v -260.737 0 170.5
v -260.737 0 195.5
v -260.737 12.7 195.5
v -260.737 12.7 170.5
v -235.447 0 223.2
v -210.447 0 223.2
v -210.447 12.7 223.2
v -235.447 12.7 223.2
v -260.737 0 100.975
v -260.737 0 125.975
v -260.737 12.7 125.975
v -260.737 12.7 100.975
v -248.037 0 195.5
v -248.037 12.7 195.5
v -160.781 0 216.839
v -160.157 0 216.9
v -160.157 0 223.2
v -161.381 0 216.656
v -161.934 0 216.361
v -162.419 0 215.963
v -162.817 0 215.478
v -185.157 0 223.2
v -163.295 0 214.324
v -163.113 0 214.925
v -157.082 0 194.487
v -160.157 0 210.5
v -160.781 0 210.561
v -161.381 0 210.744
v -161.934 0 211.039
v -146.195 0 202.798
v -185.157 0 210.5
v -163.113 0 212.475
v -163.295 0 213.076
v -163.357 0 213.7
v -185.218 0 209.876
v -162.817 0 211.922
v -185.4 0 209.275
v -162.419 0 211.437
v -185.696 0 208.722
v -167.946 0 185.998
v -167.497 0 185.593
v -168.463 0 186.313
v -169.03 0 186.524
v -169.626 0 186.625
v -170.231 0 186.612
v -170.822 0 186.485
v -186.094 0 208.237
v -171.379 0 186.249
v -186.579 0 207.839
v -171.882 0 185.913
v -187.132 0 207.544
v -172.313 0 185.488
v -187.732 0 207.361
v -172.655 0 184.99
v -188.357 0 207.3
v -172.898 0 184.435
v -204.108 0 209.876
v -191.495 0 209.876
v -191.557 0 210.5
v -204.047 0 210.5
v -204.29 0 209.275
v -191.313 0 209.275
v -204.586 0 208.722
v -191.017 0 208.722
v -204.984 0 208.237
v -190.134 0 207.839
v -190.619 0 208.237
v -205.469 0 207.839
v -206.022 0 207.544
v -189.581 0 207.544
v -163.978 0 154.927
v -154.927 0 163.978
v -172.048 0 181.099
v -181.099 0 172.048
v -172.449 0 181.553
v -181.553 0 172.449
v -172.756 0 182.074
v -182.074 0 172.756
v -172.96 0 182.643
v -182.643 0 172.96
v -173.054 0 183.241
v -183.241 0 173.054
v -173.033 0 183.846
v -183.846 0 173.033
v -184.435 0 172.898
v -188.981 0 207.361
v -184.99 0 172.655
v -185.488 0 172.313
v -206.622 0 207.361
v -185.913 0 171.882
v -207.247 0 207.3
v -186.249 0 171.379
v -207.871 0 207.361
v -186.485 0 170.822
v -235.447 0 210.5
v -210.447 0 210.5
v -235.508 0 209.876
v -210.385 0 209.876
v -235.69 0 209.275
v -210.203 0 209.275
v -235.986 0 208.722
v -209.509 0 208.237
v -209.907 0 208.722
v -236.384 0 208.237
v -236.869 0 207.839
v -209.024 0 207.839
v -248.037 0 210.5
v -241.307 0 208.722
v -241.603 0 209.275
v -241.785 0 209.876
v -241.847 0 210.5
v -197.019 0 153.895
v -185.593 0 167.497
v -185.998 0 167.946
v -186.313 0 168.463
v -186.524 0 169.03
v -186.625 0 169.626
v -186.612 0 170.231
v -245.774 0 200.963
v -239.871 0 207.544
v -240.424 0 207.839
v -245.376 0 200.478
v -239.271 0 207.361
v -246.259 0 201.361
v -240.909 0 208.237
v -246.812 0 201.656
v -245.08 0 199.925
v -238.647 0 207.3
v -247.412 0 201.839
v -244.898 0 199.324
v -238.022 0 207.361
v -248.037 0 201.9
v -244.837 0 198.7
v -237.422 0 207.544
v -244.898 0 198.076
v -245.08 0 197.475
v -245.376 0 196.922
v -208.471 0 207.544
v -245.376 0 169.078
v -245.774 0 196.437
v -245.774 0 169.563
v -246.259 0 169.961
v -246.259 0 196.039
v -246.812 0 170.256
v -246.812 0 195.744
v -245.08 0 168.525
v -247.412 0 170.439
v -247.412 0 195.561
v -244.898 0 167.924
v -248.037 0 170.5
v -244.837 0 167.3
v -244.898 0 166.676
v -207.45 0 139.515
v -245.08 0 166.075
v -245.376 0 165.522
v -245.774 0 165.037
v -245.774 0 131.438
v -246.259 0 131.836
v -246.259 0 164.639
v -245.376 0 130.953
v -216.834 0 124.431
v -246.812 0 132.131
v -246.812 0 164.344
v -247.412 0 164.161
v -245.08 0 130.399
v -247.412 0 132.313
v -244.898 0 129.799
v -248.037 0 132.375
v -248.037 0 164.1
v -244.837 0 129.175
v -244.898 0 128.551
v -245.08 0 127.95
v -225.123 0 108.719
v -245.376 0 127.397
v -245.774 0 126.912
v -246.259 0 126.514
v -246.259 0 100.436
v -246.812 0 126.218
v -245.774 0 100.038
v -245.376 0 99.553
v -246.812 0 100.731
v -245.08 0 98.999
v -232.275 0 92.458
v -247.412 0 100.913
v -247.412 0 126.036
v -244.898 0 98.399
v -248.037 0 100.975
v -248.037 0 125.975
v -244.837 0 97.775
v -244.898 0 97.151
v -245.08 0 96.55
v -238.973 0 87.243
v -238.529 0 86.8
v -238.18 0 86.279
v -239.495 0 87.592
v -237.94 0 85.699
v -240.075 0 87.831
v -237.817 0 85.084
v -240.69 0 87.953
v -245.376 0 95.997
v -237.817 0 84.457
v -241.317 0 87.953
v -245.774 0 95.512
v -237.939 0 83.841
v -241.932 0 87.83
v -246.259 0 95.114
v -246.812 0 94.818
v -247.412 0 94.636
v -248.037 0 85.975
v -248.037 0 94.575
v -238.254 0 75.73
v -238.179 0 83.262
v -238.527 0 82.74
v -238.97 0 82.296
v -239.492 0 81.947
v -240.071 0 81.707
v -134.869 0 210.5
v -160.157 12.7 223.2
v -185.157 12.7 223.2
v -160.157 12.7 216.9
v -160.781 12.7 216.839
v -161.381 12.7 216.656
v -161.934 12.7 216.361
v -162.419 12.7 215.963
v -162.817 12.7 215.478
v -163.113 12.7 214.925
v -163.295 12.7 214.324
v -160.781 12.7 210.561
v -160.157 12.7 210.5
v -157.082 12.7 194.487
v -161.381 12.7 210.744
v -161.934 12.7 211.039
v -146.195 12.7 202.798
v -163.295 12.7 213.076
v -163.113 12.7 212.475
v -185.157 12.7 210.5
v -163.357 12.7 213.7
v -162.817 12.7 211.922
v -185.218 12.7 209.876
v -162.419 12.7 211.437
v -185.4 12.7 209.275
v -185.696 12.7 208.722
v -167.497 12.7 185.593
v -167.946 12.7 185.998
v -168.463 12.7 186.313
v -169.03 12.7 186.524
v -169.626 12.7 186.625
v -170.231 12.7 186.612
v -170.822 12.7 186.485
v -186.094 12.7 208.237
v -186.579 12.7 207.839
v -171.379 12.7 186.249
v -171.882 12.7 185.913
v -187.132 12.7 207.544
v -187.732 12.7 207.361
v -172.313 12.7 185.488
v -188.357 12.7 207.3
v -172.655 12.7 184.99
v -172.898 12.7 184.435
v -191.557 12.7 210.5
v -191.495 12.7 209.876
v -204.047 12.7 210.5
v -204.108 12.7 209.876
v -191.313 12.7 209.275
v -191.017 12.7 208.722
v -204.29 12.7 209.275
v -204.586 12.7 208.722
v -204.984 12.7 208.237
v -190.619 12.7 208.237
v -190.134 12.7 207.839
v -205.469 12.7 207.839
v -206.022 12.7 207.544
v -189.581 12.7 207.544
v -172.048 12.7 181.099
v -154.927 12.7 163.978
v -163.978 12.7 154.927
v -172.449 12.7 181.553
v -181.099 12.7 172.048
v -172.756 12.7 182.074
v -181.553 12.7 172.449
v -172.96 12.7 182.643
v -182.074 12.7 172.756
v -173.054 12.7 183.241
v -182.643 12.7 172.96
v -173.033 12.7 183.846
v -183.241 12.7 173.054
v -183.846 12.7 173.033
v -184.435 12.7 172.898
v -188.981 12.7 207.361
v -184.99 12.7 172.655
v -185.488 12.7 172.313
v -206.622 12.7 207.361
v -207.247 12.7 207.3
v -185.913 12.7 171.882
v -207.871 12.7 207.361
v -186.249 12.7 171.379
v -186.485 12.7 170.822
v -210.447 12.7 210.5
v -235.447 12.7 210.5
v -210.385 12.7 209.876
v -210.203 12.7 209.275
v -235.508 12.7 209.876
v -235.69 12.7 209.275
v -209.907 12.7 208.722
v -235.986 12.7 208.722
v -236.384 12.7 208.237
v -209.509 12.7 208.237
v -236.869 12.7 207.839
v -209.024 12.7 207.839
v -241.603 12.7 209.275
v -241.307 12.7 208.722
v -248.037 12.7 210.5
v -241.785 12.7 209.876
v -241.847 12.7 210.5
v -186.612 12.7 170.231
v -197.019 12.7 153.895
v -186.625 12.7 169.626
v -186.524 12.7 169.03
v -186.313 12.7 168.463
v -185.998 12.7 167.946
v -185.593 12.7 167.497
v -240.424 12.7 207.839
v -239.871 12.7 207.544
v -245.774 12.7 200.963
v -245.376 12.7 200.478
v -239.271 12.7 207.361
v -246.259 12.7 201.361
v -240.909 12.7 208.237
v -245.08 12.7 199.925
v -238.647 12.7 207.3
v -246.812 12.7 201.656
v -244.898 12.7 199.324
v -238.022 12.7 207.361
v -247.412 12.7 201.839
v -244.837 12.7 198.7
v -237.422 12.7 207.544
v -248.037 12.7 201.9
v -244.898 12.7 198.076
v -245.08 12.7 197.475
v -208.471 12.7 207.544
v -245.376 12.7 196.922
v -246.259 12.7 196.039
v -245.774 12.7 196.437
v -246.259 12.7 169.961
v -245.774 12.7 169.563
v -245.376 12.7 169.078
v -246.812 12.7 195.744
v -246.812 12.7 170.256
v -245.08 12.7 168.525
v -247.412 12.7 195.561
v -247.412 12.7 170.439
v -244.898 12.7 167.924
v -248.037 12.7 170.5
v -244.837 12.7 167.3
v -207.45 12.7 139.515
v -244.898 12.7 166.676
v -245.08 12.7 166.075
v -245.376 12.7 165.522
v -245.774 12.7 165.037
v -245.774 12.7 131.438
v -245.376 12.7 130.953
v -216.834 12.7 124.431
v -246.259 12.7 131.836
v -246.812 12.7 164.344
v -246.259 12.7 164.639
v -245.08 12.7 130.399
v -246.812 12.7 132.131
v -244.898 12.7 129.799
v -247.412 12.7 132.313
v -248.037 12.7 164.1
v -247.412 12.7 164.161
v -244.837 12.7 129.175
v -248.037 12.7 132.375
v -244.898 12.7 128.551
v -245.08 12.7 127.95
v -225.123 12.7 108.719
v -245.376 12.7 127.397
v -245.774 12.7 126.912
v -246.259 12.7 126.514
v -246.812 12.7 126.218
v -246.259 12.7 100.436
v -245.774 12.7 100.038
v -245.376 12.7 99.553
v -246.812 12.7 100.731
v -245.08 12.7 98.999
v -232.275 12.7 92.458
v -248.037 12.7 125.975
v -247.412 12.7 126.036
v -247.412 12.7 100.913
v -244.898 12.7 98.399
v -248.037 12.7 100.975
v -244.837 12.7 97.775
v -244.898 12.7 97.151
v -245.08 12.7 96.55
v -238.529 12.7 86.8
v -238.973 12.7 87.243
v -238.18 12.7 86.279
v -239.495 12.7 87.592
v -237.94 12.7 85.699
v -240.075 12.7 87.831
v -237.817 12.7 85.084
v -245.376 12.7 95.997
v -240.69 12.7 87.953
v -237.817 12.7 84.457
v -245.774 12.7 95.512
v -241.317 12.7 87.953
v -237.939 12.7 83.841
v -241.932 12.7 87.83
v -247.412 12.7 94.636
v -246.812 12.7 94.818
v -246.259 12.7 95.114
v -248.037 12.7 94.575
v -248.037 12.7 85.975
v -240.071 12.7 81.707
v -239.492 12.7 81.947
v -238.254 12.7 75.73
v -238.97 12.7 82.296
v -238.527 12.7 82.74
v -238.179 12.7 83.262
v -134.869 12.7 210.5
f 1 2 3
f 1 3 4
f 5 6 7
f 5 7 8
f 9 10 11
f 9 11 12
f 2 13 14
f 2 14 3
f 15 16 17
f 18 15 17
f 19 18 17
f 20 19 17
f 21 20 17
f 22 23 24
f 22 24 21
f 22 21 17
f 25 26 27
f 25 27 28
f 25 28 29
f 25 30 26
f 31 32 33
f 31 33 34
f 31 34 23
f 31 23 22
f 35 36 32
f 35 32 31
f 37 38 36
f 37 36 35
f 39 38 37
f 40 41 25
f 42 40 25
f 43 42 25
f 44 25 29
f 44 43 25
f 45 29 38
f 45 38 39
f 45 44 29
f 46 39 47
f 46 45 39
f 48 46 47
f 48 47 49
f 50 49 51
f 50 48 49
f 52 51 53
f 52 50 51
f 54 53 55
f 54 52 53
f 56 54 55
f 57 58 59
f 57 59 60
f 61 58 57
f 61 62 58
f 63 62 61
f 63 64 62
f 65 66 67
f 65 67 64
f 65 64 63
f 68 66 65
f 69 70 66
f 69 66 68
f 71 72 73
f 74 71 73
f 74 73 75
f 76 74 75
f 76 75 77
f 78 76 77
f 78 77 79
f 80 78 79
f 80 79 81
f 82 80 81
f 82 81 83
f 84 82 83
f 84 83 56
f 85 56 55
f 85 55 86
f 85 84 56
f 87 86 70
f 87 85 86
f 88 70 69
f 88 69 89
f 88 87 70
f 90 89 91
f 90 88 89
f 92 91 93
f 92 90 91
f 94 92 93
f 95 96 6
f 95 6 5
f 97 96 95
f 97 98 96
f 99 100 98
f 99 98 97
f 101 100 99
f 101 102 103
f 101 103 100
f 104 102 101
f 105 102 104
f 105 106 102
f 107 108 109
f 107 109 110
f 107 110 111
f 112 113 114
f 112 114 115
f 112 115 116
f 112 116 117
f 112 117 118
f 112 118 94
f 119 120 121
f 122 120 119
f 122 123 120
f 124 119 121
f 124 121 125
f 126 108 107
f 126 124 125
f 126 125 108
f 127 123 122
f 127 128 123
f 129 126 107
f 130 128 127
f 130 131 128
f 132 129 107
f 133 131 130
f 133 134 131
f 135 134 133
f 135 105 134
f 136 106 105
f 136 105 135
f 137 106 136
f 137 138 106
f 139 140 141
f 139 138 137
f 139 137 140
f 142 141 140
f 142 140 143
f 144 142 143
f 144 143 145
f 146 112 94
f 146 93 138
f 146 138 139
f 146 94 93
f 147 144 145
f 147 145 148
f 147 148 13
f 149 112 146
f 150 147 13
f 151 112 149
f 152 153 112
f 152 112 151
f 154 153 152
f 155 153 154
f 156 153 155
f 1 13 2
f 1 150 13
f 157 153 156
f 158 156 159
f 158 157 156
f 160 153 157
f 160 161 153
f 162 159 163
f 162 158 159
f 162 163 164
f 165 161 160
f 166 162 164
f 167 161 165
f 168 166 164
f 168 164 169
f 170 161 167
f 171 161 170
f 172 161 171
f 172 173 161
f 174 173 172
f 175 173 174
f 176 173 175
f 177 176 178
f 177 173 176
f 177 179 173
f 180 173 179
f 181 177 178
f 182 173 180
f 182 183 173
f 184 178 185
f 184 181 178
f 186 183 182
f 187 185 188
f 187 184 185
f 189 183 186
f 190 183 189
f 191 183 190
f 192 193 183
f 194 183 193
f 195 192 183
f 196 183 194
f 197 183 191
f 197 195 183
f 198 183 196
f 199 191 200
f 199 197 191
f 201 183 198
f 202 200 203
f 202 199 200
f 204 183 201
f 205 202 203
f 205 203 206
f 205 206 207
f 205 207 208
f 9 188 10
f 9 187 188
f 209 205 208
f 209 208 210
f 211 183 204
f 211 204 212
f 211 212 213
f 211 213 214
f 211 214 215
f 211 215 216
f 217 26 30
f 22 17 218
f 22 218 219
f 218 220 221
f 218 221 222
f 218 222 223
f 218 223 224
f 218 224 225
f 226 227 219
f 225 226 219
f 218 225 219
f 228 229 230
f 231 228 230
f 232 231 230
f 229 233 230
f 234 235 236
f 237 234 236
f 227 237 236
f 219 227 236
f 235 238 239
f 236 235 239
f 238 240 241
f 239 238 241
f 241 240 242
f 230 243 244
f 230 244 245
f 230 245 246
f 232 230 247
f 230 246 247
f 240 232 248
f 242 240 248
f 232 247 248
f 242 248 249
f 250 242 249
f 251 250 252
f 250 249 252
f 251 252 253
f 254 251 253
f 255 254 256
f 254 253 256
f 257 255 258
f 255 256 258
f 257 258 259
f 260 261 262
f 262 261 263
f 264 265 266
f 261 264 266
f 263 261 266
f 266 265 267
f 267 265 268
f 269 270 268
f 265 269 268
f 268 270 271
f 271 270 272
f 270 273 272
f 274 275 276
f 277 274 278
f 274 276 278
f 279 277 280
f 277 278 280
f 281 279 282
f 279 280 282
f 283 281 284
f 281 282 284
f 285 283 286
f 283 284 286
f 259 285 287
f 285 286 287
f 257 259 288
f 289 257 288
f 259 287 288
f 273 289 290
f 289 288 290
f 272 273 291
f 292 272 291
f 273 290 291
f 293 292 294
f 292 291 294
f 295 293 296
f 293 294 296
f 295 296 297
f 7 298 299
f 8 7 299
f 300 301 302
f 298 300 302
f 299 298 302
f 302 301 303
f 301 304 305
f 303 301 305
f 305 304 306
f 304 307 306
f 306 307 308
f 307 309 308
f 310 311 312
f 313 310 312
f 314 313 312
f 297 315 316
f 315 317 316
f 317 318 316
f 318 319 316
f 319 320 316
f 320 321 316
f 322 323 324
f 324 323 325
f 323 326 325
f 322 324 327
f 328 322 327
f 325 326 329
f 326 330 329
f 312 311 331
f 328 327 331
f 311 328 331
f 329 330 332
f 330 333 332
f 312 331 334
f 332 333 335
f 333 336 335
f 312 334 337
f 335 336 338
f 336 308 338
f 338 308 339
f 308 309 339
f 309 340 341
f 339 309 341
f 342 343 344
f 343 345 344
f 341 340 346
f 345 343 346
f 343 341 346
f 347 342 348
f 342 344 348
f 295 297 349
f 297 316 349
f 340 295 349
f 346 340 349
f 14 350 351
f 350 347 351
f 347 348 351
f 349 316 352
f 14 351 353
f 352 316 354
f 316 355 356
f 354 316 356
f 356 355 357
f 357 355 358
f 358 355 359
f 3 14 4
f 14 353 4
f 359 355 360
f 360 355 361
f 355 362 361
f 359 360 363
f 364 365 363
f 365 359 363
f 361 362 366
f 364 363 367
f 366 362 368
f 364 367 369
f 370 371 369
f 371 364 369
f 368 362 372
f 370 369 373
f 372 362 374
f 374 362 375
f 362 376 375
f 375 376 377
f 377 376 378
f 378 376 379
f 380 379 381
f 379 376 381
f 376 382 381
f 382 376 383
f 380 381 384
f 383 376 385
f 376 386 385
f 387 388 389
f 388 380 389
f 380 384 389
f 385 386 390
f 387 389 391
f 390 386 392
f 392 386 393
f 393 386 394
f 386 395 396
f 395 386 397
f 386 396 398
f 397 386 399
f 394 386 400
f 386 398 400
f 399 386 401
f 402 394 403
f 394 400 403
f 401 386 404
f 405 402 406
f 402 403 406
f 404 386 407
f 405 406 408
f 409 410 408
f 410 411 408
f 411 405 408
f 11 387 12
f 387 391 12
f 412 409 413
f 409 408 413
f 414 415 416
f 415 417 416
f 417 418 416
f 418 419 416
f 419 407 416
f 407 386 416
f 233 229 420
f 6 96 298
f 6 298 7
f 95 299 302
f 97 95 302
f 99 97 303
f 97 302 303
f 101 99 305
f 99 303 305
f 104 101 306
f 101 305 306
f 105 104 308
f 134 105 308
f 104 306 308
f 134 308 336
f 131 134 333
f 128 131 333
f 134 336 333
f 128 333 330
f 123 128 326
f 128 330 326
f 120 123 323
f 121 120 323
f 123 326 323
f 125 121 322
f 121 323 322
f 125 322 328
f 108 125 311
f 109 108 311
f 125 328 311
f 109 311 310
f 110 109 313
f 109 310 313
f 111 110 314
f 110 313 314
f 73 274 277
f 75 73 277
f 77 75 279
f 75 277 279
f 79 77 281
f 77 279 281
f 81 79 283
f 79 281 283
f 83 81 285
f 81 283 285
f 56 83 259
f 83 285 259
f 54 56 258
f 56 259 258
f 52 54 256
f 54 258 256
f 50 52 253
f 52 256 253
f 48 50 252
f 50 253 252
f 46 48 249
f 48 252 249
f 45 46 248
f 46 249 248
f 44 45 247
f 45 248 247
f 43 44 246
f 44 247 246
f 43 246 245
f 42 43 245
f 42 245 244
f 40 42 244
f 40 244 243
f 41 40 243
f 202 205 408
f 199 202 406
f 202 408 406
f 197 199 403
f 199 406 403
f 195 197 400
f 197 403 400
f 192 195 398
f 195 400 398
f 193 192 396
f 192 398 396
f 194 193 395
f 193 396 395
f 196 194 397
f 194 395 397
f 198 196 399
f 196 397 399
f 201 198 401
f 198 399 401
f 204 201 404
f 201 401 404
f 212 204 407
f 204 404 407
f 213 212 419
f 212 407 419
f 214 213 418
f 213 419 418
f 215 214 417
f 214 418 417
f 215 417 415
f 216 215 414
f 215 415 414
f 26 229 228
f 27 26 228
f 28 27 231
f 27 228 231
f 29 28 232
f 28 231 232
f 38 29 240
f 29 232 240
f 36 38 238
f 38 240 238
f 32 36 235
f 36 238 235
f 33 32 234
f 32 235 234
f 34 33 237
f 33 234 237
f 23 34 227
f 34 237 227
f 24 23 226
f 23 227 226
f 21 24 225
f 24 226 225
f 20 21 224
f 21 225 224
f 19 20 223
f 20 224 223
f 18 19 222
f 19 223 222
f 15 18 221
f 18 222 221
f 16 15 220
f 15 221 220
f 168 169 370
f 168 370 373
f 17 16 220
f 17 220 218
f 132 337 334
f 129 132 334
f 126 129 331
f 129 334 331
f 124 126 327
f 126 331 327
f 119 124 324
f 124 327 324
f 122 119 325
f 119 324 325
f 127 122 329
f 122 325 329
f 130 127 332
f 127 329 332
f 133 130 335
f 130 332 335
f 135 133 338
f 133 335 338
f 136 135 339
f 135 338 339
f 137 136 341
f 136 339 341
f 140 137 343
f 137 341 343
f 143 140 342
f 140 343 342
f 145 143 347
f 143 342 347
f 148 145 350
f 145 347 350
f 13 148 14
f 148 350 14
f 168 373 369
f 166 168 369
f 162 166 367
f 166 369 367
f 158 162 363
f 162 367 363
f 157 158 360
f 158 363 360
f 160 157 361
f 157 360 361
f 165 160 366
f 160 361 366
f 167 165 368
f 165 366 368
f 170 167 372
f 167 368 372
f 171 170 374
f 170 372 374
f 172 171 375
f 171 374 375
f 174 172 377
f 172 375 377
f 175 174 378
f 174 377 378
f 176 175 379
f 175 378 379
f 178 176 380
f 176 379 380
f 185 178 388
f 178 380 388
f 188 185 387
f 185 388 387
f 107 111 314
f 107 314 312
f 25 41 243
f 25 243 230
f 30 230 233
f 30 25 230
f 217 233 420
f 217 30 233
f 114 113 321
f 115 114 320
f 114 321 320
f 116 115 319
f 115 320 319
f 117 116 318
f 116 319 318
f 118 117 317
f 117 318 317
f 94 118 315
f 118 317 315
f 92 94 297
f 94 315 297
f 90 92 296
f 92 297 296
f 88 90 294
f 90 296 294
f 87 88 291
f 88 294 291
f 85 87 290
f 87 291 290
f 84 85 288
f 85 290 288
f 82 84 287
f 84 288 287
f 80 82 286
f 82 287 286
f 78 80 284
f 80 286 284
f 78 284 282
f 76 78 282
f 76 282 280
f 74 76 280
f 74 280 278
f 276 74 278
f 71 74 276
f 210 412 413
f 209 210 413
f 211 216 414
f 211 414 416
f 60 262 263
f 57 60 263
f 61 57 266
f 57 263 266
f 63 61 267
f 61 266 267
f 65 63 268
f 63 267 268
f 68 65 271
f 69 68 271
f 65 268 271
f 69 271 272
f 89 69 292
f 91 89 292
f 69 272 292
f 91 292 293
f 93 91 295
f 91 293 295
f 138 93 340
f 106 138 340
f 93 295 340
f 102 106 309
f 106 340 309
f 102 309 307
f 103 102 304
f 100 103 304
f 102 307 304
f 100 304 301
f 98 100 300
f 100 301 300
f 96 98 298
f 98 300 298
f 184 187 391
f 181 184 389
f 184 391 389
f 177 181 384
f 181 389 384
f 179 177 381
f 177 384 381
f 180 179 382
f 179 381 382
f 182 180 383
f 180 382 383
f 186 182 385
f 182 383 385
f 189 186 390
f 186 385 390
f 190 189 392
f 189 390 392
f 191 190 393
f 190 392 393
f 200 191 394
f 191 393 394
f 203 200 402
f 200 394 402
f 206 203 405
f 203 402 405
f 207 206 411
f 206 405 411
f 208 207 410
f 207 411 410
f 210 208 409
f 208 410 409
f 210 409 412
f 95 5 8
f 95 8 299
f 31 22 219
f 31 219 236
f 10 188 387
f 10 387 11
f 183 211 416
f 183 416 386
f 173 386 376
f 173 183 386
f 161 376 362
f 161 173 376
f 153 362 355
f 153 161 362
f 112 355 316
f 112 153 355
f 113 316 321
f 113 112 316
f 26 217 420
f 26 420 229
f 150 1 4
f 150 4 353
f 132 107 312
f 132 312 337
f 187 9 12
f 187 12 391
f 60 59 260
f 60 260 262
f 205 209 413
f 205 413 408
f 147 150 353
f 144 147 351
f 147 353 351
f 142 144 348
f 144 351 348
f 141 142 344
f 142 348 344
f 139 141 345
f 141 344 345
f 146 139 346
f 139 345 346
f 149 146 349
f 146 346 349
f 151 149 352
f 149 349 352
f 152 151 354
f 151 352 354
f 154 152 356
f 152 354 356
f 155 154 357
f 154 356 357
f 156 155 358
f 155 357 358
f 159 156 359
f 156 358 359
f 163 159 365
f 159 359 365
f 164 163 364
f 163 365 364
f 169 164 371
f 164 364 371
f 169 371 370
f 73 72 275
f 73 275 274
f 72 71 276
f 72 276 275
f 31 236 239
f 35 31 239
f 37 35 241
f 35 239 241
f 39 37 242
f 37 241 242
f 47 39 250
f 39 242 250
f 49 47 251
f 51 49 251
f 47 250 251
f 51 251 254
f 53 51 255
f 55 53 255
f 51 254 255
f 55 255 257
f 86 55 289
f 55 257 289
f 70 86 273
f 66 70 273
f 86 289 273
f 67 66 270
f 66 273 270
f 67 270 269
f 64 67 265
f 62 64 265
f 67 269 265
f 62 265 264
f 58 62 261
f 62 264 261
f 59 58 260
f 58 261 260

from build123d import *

# Parameters (mm, degrees)
BOSS_EXTRUDE1_DEPTH = 12.7
SKETCH2_R           = 3.2
CUT_EXTRUDE1_DEPTH  = 344.457619003


with BuildPart() as part:
    # Sketch1 → Boss-Extrude1 (new body)
    with BuildSketch(Plane(origin=(0, 0, 0), x_dir=(1, 0, 0), z_dir=(0, 1, 0))):
        with BuildLine():
            Line((-134.869381255, -210.5), (-160.156660352, -210.5))
            Line((-160.156660352, -210.5), (-160.156660352, -223.2))
            Line((-160.156660352, -223.2), (-185.156660352, -223.2))
            Line((-185.156660352, -223.2), (-185.156660352, -210.5))
            Line((-185.156660352, -210.5), (-210.446660352, -210.5))
            Line((-210.446660352, -210.5), (-210.446660352, -223.2))
            Line((-210.446660352, -223.2), (-235.446660352, -223.2))
            Line((-235.446660352, -223.2), (-235.446660352, -210.5))
            Line((-235.446660352, -210.5), (-248.036660352, -210.5))
            Line((-248.036660352, -210.5), (-248.036660352, -195.5))
            Line((-248.036660352, -195.5), (-260.736660352, -195.5))
            Line((-260.736660352, -195.5), (-260.736660352, -170.5))
            Line((-260.736660352, -170.5), (-248.036660352, -170.5))
            Line((-248.036660352, -170.5), (-248.036660352, -125.974827547))
            Line((-248.036660352, -125.974827547), (-260.736660352, -125.974827547))
            Line((-260.736660352, -125.974827547), (-260.736660352, -100.974827547))
            Line((-260.736660352, -100.974827547), (-248.036660352, -100.974827547))
            Line((-248.036660352, -100.974827547), (-248.036660352, -85.974827547))
            Line((-248.036660352, -85.974827547), (-241.932414551, -87.830328326))
            Line((-241.932414551, -87.830328326), (-238.254147431, -75.729526817))
            ThreePointArc((-238.254147431, -75.729526817), (-215.223229772, -127.196546204), (-181.244243015, -172.193276216))
            Line((-181.244243015, -172.193276216), (-163.978062557, -154.927095758))
            Line((-163.978062557, -154.927095758), (-154.927095758, -163.978062557))
            Line((-154.927095758, -163.978062557), (-172.193276216, -181.244243015))
            ThreePointArc((-172.193276216, -181.244243015), (-154.226598654, -196.759132616), (-134.869381255, -210.5))
        make_face()
    extrude(amount=BOSS_EXTRUDE1_DEPTH)

    # Sketch2 → Cut-Extrude1 (cut, through all)
    with BuildSketch(Plane(origin=(0, 12.7, 0), x_dir=(1, 0, 0), z_dir=(0, 1, 0))):
        with Locations((-248.036660352, -129.174827547)):
            Circle(SKETCH2_R)
        with Locations((-248.036660352, -97.774827547)):
            Circle(SKETCH2_R)
        with Locations((-248.036660352, -167.3)):
            Circle(SKETCH2_R)
        with Locations((-248.036660352, -198.7)):
            Circle(SKETCH2_R)
        with Locations((-238.646660352, -210.5)):
            Circle(SKETCH2_R)
        with Locations((-207.246660352, -210.5)):
            Circle(SKETCH2_R)
        with Locations((-188.356660352, -210.5)):
            Circle(SKETCH2_R)
        with Locations((-160.156660352, -213.7)):
            Circle(SKETCH2_R)
        with Locations((-183.433424282, -169.859291345)):
            Circle(SKETCH2_R)
        with Locations((-169.859291345, -183.433424282)):
            Circle(SKETCH2_R)
        with Locations((-241.001759282, -84.768648922)):
            Circle(SKETCH2_R)
    extrude(amount=-CUT_EXTRUDE1_DEPTH, mode=Mode.SUBTRACT)


solid = part.part
